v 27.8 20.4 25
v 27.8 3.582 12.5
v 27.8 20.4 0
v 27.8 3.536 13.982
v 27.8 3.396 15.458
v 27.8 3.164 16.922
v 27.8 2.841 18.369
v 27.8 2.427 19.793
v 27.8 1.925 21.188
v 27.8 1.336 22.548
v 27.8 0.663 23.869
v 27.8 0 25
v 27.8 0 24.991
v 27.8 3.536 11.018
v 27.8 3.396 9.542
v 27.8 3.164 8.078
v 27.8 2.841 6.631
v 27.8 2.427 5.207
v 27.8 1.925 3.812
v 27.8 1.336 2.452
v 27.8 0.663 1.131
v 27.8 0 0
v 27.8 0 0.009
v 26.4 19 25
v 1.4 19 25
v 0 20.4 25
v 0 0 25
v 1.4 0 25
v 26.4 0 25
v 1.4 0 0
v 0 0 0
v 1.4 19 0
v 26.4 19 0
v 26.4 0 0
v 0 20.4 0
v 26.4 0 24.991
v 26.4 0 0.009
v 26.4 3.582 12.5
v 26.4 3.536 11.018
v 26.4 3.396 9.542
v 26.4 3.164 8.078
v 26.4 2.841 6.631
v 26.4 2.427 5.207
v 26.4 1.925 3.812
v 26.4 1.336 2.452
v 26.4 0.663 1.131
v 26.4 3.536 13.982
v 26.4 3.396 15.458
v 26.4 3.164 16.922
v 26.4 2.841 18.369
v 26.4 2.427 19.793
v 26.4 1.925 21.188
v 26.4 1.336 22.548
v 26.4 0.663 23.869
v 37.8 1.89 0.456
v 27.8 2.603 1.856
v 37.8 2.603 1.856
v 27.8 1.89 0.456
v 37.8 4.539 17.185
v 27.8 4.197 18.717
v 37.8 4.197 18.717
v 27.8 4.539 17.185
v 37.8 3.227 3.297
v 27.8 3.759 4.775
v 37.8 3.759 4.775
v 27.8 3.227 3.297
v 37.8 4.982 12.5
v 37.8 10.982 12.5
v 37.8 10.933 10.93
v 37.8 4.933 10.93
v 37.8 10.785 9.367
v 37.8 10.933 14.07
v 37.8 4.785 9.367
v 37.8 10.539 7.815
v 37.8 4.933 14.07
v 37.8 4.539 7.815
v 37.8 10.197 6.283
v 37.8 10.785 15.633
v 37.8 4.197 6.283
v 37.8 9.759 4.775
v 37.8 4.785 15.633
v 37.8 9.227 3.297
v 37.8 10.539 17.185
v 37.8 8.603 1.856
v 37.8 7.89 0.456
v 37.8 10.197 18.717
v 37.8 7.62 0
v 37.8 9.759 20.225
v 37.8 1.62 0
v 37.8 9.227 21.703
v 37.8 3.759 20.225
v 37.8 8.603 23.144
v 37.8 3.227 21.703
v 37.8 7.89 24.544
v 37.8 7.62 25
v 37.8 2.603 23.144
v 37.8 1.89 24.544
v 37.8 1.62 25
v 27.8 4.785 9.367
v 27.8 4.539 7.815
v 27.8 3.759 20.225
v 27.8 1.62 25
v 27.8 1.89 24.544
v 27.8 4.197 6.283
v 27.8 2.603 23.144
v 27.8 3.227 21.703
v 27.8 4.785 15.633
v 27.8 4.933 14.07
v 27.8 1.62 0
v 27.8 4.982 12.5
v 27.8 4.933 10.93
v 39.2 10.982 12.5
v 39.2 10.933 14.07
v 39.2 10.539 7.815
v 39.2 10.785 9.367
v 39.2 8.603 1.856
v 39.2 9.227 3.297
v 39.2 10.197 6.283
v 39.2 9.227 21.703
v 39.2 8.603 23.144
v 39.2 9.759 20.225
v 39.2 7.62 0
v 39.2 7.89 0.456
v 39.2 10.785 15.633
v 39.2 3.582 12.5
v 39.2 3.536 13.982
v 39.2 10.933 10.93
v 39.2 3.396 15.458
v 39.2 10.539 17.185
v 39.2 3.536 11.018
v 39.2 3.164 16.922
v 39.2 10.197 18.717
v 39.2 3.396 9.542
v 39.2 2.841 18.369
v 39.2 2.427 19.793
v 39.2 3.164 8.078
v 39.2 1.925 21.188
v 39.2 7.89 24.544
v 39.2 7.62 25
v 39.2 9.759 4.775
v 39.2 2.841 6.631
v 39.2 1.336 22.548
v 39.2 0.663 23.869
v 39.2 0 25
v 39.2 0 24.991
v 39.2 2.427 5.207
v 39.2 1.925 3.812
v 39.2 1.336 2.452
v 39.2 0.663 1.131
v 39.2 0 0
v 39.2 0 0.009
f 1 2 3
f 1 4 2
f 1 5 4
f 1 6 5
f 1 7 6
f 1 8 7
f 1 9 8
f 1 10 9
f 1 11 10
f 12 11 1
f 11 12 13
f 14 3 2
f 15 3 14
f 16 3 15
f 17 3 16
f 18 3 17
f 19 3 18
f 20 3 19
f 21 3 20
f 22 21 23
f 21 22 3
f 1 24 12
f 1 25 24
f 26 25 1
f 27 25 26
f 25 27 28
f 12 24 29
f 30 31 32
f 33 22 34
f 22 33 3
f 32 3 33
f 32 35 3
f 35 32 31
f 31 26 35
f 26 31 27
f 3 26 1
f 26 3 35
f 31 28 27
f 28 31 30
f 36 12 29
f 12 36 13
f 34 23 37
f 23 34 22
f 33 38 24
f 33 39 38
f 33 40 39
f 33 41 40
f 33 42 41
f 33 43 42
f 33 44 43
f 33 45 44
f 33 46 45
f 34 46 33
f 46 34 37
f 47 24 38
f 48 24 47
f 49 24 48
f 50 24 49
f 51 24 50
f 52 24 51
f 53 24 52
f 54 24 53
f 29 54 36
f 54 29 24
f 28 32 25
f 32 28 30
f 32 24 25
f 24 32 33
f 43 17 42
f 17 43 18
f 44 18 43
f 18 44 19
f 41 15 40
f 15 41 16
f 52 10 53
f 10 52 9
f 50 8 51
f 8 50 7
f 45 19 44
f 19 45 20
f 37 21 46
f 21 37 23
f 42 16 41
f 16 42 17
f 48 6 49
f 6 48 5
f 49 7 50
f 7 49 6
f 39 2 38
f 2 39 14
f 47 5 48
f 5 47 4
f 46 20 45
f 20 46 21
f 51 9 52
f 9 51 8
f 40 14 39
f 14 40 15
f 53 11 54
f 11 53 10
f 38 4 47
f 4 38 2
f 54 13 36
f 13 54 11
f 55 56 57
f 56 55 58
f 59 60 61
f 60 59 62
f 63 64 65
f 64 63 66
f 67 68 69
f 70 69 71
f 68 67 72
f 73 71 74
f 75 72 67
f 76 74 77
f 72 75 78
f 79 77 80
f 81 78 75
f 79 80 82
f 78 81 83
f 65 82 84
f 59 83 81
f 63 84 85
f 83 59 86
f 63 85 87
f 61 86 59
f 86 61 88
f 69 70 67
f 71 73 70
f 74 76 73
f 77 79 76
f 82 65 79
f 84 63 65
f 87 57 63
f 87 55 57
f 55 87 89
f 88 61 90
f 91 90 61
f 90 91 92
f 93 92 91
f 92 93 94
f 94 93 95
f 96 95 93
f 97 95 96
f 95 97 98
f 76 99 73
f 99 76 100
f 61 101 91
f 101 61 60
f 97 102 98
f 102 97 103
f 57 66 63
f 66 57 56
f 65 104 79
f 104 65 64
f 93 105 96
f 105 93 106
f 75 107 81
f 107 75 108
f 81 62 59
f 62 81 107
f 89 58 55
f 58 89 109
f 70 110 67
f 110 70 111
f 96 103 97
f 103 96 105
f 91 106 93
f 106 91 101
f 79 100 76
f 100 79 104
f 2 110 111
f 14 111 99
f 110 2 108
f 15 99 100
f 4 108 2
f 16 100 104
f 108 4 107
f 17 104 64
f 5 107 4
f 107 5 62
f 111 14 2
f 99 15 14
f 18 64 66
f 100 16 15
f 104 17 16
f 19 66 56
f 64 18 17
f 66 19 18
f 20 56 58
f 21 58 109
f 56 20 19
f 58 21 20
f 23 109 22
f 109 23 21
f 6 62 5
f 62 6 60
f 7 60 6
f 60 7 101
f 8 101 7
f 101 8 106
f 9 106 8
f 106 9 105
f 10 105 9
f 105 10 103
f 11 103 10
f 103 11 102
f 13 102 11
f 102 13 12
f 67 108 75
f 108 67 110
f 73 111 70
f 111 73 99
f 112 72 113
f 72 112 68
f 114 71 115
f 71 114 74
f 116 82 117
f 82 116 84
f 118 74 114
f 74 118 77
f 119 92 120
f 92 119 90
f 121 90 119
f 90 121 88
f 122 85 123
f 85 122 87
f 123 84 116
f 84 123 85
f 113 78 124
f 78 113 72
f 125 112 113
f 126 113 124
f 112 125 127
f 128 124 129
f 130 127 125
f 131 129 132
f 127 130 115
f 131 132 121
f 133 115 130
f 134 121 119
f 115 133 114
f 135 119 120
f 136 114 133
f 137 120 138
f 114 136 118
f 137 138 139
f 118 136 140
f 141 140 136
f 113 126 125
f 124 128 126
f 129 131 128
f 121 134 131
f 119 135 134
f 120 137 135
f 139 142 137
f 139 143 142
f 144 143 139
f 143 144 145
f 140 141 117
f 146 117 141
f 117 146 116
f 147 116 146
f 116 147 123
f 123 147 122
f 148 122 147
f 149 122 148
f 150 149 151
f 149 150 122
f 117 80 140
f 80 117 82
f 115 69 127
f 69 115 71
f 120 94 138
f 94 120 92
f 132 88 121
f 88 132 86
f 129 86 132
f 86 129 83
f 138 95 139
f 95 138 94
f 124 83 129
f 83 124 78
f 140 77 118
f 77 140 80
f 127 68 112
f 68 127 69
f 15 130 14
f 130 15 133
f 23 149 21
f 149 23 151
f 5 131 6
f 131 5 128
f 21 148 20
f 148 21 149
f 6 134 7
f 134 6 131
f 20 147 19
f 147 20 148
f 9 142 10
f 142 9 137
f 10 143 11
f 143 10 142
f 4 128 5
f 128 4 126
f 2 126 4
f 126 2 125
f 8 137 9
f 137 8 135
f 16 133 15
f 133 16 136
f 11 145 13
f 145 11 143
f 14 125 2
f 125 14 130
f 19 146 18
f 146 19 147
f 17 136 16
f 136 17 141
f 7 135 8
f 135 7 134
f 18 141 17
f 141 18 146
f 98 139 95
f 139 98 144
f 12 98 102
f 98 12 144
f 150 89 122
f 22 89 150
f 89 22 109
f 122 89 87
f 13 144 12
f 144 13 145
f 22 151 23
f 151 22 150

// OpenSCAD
//Monitor Depth
monD=25;

//Monitor frame
monF=19;

//Headset Depth
heaD=10;

//Headset Diameter
heaDiameter = 50;

//Headset lip;
heaL=6;

//Total width
width=25;

//thickness
thick=1.4;

//face number
$fn=100;

//security
heaDia= max(width+thick*2,heaDiameter);

function pyth(a,h) = sqrt(h*h - a*a);

difference() {
    cube([monD+thick*2,monF+thick,width]);
    translate([thick,-0.1,-0.1]) cube([monD,monF+0.1,width+0.2]);
   // translate([thick*2+monD,thick,0]) cube([heaD,monF,width]);
    translate([thick+monD,-pyth(width/2,(heaDia-thick*2)/2),width/2])rotate([0,90,0])
    cylinder(d=heaDia-thick*2,h=thick);
}
intersection(){
translate([thick*2+monD,-pyth(width/2,(heaDia-thick*2)/2),width/2])
rotate([0,90,0])
difference(){
    union(){
        cylinder(d=heaDia,h=heaD);
        translate([0,heaL,heaD])cylinder(d=heaDia,h=thick);
    }
    cylinder(d=heaDia-thick*2,h=heaD+thick);
}
cube([monD+thick*3+heaD,monF+thick,width]);
}
